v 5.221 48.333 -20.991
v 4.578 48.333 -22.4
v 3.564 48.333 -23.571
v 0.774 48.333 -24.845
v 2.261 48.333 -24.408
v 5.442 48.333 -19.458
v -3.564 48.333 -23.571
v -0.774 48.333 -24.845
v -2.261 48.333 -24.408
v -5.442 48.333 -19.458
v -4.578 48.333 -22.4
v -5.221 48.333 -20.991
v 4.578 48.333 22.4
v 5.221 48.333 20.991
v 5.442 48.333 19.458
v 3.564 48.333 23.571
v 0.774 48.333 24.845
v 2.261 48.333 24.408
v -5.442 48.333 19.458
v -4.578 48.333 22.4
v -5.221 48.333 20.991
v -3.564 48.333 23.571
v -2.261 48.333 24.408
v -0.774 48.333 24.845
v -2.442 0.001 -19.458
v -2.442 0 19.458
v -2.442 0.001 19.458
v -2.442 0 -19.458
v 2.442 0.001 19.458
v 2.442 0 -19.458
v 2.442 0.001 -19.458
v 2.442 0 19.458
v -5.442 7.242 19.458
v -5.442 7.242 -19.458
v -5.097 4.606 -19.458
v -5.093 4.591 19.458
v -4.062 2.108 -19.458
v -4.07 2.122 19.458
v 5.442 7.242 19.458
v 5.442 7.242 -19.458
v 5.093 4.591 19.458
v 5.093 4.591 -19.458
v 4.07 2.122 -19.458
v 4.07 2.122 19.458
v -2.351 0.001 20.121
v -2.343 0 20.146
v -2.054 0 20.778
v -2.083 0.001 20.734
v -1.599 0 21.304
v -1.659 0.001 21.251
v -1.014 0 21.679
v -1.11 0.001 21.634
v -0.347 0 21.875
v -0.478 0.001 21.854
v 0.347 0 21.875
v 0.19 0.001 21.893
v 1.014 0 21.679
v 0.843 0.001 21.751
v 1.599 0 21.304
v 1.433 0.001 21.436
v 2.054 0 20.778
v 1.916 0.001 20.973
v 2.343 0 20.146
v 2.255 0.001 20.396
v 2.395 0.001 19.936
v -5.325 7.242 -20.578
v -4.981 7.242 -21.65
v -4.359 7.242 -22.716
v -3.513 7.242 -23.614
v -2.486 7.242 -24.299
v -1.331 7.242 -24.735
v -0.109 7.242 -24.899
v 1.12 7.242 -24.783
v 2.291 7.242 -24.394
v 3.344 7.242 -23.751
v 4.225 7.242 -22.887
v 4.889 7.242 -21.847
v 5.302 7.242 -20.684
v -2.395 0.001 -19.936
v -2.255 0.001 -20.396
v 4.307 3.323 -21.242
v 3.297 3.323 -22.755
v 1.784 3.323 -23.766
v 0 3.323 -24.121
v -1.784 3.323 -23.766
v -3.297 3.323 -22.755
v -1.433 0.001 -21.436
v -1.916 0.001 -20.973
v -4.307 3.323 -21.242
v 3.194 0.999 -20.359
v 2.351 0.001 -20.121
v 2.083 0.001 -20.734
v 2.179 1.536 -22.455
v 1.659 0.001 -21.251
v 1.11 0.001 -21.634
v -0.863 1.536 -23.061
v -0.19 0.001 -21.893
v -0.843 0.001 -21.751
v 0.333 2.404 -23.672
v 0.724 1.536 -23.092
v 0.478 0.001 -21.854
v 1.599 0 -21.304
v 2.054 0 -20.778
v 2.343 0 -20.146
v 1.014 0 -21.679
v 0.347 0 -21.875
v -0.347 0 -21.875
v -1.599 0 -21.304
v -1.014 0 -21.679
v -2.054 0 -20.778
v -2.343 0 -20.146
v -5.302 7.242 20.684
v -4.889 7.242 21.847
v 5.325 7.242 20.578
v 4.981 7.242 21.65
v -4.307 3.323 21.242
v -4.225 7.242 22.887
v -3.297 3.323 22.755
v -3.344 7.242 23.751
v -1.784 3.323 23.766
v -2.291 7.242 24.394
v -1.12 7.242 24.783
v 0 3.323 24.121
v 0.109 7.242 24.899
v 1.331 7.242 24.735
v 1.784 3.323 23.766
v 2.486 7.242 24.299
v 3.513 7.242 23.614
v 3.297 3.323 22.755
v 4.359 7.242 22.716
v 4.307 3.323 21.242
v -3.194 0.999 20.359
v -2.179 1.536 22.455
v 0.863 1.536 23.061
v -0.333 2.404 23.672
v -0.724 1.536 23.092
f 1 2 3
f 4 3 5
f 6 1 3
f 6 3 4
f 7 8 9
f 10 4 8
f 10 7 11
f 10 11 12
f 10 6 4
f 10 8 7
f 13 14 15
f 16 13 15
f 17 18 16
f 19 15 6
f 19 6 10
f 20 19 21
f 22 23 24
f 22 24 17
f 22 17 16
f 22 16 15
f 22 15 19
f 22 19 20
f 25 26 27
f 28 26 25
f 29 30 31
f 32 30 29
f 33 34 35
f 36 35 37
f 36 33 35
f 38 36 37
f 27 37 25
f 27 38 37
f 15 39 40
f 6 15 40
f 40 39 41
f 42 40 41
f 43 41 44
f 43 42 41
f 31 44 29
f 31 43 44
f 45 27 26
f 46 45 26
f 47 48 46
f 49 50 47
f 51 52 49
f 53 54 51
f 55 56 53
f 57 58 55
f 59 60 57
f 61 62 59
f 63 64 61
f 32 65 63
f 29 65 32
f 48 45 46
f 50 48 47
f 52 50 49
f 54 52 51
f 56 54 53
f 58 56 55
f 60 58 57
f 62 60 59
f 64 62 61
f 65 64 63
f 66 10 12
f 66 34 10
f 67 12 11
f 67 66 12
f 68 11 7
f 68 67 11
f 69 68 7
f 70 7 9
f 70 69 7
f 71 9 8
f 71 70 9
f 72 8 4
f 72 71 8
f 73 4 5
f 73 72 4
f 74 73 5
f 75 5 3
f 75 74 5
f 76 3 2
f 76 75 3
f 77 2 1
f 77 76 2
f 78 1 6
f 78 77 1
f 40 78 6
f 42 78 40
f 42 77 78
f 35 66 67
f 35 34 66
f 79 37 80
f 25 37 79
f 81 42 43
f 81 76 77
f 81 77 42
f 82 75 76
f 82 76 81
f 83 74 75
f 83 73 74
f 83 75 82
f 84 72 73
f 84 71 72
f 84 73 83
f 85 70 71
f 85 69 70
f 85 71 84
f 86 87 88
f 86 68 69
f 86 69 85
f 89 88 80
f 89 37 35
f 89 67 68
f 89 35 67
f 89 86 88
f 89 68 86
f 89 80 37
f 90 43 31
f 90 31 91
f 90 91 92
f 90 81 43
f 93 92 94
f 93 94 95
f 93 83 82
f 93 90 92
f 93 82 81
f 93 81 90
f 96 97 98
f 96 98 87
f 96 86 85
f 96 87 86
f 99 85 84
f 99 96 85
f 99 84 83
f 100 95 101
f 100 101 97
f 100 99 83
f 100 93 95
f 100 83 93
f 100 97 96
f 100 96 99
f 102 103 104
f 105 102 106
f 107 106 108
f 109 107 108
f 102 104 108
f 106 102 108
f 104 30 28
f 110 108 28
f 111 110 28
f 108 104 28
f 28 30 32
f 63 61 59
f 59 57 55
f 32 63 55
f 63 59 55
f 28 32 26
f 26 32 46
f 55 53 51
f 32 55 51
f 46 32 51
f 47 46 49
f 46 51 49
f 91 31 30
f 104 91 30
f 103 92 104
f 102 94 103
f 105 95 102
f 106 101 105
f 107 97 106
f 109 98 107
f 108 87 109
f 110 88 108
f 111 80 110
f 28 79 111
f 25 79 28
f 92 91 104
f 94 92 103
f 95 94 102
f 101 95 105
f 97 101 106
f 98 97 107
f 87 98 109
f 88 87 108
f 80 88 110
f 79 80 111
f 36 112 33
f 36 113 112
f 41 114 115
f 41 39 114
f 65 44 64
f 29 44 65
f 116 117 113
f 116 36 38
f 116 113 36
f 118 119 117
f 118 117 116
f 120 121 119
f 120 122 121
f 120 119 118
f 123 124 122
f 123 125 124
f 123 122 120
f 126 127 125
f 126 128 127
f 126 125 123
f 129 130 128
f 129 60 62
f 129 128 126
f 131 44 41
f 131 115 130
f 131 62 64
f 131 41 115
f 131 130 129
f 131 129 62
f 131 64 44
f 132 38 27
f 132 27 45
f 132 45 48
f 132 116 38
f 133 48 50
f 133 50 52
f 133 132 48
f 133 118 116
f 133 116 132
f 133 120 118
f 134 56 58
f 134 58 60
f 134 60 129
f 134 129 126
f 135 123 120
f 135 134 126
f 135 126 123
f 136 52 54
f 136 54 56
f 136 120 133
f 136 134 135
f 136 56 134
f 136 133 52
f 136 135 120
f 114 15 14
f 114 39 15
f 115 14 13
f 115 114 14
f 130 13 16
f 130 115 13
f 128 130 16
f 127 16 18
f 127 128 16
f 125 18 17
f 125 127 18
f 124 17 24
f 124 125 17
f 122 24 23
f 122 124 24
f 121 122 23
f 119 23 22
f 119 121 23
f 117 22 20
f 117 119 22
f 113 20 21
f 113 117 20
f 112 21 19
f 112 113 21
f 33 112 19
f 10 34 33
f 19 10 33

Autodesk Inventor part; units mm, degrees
ref_plane "YZ Plane" through (0, 0, 0) normal (1, 0, 0) x (0, 1, 0)
ref_plane "XZ Plane" through (0, 0, 0) normal (0, 1, 0) x (-1, 0, 0)
ref_plane "XY Plane" through (0, 0, 0) normal (0, 0, 1) x (1, 0, 0)
sketch "Sketch1" plane through (0, 0, 0) normal (0, 1, 0) x (-1, 0, 0)
  line L0 (0, -19.4583) -> (0, 19.4583) construction
  line L1 (5.5417, -19.4583) -> (5.5417, 19.4583) construction
  line L2 (-5.5417, 19.4583) -> (-5.5417, -19.4583) construction
  arc A0 (-5.5417, -19.4583) -> (5.5417, -19.4583) centre (0, -19.4583) ccw construction
  arc A1 (5.5417, 19.4583) -> (-5.5417, 19.4583) centre (0, 19.4583) ccw construction
  line L3 (-5.4417, 19.4583) -> (-5.4417, -19.4583)
  arc A2 (-5.4417, -19.4583) -> (5.4417, -19.4583) centre (0, -19.4583) ccw
  line L4 (5.4417, -19.4583) -> (5.4417, 19.4583)
  arc A3 (5.4417, 19.4583) -> (-5.4417, 19.4583) centre (0, 19.4583) ccw
  point P0 (0, 0)
  dimension "d0" = 5.5417
  dimension "d1" = 38.9167
  dimension "d2" = 0.1
extrude "Extrusion1" add sketch "Sketch1" along normal blind 48.3333
chamfer "Chamfer1" distance 3 angle 45 4 edges at (5.4417, 0, 0) (0, 0, -24.9) (-5.4417, 0, 0) (0, 0, 24.9)
fillet "Fillet2" radius 10.24 4 edges at (0, 3, 24.9) (-5.4417, 3, 0) (0, 3, -24.9) (5.4417, 3, 0)
properties part number "Contenedor anti-fuga (para imprimir en modo espiral)"
